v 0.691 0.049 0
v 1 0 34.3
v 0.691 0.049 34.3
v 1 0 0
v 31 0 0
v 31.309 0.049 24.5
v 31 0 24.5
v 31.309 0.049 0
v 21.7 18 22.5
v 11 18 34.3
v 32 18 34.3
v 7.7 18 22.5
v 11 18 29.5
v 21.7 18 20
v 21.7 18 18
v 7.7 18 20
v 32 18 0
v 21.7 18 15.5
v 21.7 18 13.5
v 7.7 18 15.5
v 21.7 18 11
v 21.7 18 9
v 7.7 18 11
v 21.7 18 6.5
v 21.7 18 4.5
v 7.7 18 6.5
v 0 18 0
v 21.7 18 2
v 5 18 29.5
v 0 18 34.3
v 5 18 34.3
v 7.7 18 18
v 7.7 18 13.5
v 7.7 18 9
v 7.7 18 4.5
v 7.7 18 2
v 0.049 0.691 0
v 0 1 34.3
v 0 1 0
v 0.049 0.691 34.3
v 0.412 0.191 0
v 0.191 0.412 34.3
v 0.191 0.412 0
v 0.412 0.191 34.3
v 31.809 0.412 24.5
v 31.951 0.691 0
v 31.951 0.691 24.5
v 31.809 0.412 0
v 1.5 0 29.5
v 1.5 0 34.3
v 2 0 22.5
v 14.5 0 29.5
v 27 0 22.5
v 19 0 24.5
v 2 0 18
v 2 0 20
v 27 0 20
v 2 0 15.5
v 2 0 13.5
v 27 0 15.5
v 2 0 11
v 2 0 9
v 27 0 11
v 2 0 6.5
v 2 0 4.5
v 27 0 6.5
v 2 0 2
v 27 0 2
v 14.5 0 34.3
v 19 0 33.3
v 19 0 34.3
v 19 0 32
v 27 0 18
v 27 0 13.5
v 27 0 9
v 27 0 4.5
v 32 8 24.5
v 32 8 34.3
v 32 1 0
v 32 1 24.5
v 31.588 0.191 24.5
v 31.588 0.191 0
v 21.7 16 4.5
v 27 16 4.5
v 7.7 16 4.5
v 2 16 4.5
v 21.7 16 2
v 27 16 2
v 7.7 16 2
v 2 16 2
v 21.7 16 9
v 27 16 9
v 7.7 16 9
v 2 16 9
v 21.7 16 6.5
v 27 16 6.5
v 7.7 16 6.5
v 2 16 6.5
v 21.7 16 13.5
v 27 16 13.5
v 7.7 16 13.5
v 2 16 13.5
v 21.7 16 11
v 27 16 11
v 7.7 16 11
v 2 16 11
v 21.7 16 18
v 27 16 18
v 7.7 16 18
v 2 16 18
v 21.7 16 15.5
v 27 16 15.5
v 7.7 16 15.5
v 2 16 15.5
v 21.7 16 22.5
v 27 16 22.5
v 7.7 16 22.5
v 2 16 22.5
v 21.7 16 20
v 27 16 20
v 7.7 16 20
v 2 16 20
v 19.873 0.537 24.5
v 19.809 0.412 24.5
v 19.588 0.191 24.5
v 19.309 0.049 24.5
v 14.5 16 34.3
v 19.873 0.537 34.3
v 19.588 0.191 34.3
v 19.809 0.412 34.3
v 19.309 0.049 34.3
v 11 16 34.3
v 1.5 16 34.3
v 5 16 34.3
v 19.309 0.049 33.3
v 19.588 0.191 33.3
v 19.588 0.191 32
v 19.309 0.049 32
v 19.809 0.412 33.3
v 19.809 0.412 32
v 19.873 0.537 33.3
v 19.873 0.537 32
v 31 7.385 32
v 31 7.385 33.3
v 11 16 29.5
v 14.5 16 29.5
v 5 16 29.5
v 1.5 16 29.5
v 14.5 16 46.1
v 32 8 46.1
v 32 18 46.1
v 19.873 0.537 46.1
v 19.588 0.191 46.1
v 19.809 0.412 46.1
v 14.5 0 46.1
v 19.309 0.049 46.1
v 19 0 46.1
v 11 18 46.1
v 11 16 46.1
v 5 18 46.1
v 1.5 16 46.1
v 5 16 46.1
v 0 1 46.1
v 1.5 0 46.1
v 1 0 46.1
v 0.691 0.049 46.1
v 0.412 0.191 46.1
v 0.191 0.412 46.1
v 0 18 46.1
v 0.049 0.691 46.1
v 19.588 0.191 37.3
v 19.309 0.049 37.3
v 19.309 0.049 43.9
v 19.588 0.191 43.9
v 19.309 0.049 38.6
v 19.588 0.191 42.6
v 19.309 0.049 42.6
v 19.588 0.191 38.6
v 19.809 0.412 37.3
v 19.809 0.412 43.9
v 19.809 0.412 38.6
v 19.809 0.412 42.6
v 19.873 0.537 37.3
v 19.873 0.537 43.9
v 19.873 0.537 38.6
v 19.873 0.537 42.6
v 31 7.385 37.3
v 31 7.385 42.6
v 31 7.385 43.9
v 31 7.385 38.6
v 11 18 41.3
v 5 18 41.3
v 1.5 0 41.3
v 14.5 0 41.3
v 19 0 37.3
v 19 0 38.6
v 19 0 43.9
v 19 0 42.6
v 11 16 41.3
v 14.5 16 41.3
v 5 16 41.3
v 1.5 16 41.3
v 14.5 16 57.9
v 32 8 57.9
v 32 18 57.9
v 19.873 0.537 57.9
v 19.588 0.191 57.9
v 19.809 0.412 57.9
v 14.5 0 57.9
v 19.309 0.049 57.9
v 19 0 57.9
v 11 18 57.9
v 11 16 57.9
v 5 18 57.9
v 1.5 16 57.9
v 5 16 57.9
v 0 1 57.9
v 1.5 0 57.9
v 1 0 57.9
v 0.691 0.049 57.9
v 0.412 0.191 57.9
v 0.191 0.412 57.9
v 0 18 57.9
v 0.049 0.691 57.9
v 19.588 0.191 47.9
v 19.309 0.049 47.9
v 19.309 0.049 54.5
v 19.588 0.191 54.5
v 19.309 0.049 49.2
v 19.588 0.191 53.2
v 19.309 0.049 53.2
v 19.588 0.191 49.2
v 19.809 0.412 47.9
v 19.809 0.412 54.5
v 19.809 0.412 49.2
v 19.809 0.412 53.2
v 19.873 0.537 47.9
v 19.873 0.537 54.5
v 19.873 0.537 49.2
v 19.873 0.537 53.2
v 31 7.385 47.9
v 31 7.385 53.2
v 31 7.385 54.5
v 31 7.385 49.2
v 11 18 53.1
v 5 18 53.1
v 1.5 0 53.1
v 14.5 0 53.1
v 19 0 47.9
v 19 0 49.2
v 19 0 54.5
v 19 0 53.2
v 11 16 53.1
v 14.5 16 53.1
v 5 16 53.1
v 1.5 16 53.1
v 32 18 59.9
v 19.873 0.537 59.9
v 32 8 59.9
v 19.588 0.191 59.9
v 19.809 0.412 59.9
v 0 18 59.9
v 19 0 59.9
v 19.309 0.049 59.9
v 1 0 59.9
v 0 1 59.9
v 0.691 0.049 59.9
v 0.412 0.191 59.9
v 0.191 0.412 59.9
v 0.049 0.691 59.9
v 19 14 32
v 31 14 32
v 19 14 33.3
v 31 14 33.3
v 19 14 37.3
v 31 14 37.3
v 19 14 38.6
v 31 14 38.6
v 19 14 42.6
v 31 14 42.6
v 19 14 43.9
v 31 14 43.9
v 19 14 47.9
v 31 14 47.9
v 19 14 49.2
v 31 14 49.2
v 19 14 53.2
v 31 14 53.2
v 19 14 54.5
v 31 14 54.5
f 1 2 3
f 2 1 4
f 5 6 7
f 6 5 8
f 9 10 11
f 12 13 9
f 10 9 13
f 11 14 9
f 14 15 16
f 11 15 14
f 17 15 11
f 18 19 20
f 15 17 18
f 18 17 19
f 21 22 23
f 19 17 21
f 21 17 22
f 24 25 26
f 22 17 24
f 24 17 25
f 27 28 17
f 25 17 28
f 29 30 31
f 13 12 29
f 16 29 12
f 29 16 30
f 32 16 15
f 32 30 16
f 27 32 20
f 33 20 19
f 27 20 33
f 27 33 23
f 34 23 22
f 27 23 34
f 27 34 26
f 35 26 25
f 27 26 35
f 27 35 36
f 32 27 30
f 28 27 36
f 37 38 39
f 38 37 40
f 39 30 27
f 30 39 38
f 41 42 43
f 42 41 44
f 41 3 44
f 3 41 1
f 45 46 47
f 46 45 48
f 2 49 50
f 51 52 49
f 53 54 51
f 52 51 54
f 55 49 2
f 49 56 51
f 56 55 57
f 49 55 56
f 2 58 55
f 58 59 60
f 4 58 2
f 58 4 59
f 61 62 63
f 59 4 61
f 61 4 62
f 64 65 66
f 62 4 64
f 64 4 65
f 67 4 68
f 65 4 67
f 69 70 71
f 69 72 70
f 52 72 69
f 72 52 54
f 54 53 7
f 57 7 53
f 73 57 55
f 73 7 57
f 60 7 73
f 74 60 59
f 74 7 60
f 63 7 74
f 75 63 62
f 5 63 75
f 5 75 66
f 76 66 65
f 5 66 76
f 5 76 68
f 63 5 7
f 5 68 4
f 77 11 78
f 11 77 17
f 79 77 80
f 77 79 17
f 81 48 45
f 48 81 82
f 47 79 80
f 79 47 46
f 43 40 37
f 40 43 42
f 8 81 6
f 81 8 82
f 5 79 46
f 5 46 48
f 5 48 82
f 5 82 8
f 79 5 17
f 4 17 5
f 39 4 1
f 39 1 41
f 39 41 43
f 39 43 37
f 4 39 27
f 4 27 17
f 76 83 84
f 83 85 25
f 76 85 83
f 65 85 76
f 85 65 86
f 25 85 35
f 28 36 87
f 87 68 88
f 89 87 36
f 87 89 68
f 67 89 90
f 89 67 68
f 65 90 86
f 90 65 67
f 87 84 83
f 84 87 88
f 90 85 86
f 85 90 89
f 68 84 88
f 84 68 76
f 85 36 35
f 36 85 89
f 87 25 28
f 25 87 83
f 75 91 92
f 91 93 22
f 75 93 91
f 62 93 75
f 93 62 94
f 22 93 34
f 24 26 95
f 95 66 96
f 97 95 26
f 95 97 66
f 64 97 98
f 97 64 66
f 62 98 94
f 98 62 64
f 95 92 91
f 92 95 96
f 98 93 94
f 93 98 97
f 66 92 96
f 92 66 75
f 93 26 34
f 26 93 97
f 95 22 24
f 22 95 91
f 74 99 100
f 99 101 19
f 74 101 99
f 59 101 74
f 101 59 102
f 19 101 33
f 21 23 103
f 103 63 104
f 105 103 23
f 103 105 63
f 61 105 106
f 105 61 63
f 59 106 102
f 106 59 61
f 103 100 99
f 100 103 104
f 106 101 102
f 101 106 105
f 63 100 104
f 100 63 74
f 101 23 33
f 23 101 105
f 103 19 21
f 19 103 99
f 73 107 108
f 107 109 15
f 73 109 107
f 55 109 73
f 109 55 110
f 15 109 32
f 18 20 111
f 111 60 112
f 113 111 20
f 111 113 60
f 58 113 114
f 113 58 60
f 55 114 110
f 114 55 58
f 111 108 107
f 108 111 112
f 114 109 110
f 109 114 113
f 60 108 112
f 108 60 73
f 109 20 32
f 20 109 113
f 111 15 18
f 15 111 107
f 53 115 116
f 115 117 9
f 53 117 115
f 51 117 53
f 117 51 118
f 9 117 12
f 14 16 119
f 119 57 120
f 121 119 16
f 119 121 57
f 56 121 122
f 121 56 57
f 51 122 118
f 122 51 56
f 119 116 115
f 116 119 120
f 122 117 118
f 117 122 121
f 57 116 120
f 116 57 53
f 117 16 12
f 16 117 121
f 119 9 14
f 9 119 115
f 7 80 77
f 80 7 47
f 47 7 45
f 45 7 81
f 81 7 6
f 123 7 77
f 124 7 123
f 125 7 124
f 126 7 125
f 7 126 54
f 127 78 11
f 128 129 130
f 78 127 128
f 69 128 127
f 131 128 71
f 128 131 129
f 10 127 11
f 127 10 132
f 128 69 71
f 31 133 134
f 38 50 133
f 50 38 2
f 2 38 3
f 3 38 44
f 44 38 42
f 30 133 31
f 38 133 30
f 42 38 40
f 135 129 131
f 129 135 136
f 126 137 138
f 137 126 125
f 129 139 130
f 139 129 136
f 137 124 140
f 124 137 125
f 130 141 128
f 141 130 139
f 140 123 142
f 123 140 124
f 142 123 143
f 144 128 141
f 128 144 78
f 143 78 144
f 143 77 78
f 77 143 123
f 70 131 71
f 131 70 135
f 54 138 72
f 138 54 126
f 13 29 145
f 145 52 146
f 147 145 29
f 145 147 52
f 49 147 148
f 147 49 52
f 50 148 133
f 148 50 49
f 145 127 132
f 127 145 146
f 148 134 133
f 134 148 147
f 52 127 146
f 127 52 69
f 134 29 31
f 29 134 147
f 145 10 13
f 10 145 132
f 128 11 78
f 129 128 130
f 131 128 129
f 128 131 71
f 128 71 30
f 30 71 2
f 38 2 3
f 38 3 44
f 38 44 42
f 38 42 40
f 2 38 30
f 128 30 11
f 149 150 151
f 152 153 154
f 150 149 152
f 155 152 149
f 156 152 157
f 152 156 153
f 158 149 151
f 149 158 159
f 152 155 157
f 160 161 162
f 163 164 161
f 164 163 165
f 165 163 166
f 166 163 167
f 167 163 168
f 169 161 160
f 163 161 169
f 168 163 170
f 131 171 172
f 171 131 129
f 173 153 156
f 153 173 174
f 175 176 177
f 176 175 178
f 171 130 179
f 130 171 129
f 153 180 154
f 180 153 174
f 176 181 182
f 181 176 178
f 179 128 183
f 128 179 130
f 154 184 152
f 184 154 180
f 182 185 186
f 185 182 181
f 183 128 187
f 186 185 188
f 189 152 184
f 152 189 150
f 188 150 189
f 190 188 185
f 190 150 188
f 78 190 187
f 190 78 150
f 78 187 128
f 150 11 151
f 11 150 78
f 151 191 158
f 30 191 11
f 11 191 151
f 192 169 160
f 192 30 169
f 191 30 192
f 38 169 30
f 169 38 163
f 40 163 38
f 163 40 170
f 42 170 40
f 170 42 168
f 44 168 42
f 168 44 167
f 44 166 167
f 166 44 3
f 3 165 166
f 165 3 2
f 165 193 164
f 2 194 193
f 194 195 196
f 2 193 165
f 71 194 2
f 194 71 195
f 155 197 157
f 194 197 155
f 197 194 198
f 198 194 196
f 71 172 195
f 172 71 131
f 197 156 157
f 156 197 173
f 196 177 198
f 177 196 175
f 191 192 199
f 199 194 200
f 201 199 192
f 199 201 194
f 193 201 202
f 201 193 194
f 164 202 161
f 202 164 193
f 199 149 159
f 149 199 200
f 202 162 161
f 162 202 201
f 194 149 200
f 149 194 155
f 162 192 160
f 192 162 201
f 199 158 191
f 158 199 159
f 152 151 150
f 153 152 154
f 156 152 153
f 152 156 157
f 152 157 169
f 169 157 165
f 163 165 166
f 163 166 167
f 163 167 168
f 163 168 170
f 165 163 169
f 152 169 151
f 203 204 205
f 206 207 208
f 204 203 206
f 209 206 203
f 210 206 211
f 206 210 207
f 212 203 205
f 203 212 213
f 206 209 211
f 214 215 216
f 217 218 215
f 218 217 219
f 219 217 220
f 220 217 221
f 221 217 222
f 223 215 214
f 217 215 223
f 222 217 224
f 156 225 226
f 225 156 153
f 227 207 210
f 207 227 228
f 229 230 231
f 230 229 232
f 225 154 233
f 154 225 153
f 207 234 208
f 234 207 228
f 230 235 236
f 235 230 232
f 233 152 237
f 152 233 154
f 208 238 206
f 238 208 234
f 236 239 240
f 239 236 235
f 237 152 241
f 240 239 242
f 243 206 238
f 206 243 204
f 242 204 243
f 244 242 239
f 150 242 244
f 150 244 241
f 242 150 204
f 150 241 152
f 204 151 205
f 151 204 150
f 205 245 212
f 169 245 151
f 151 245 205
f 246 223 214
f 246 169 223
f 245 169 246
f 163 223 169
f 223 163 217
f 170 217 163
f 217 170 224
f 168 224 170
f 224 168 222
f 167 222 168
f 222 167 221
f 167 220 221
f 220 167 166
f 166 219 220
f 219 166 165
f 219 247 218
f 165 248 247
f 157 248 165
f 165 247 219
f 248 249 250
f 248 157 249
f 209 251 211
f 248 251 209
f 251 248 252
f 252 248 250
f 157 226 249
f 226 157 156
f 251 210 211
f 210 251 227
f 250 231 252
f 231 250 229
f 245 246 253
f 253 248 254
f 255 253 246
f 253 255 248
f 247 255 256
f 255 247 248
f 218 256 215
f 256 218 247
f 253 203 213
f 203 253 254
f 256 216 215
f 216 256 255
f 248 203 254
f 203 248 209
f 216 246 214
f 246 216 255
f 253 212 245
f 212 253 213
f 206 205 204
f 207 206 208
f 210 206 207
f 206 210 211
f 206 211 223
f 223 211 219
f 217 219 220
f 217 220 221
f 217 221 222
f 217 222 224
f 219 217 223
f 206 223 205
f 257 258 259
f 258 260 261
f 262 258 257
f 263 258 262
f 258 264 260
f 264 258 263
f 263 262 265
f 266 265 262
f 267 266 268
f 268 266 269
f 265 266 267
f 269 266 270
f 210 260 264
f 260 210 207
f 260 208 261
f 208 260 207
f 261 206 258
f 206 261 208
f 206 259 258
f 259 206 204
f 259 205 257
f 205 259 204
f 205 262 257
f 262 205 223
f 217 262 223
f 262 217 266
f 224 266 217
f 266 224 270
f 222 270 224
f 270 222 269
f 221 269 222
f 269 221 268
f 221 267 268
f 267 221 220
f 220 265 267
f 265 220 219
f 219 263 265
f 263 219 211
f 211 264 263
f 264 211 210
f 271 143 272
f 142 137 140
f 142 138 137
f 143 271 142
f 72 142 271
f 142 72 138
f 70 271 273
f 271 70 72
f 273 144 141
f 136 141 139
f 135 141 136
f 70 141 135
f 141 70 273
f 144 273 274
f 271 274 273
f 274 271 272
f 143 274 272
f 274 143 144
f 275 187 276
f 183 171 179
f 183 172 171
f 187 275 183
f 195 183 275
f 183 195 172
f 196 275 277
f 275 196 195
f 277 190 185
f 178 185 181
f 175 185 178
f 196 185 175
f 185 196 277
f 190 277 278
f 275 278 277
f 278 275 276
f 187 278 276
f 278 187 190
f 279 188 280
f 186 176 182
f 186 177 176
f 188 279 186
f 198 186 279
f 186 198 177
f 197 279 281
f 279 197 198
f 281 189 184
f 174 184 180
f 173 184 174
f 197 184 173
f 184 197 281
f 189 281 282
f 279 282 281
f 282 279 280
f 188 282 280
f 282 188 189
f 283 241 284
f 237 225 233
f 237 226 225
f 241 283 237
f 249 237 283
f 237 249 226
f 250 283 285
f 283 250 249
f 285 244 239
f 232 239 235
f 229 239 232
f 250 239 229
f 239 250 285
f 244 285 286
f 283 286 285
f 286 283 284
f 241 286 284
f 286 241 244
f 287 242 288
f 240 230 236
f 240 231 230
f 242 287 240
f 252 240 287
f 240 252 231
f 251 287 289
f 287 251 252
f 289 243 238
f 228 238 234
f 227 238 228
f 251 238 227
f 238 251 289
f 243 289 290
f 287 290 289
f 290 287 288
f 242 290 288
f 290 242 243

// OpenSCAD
// 
// (c) g3org 

//Count of SD Slots
    count_SD = 5;
//SD Card thickness
    SD_thickness=2.5;

//Count of SD Slots
    count_USB = 3;
//USB Slot thickness
    USB_thickness =4.8;
//Space between USB Slots
    USB_space = 7;

//Count micro SD 
    count_microSD =5;
//micro SD thickness
    microSD_thickness =1.3;


//Full_Render


/* [Hidden] */
$fn=20;

//inputs end

color("LawnGreen"){  
    SD_Card_render();
        difference() {
            USB_Slot();
            microSD();
        }
}



module microSD(){
    
    
     //micro SD_slot
    for (i = [ 0 : count_microSD-1 ] ) {
    
            translate([19,0,((count_SD*(SD_thickness+2.5))+USB_space)+(i*(microSD_thickness+4))]){
                linear_extrude(height = microSD_thickness, center = false, convexity = 10) {
                square([12,14]);
                }
            }
    }
}
module USB_Slot(){
    
  translate([0,0,count_SD*(SD_thickness+2)]){
   for (i = [ 0-1 : count_USB-2 ] ) {    
       
    translate([0,0,i*(USB_space+USB_thickness) ]){
        echo(i,i*(USB_space+USB_thickness));  
        difference() {
            // Block plus Rundung
            linear_extrude(height = USB_thickness+USB_space, center = false, convexity = 10) {
            translate([19,1,0,])  circle(1);
                translate([1,1,0,])  circle(1);
                polygon([[1,0],[19,0],[32,8],[32,18],[0,18],[0,1]],[[0,1,2,3,4,5]]);
           }
 //USB_slot_Schlitz
            translate([1.5,-3,USB_space]){
                linear_extrude(height = USB_thickness, center = false, convexity = 10) {
                square([13,19]);
                }
            }
  //Bodendurchbruch          
             translate([5,1,USB_space,]){
                linear_extrude(height = USB_thickness, center = false, convexity = 10) {
                square([6,19]);
                }
            } 
        } 
    } 
    i = i+1; 
  } 
  
  //Abschlussplatte_USB_Slots
      translate([0,0,count_USB*(USB_thickness+USB_space)]){
          linear_extrude(height = 2, center = false, convexity = 10) {
                translate([19,1,0,])  circle(1);
                translate([1,1,0,])  circle(1);
                polygon([[1,0],[19,0],[32,8],[32,18],[0,18],[0,1]],[[0,1,2,3,4,5]]);
            }
       } 
    }
}


module SD_Card_render(){
    
  for (i = [ 0 : count_SD-1 ] ) {    
    translate([0,0,i*(SD_thickness+2)-(SD_thickness+2)]){
        difference() {
            // Block plus Rundung
            linear_extrude(height = SD_thickness+2, center = false, convexity = 10) {
                translate([1,0,0,])   square([30,17]);
                translate([0,1,0,])  square([32,17]);
                translate([31,1,0,])  circle(1);
                translate([1,1,0,])  circle(1);
            }
  //SD_slot_Schlitz
            translate([2,-3,2,]){
                linear_extrude(height = SD_thickness, center = false, convexity = 10) {
                square([25,19]);
                }
            }
  //Bodendurchbruch          
            translate([7.7,1,2,]){
                linear_extrude(height = SD_thickness, center = false, convexity = 10) {
                square([14,19]);
                }
            }
        }
    }
    i = i+1;
  }
  //Abschlussplatte_SD_Cars Slots
      translate([0,0,count_SD*(SD_thickness+2)]){
          linear_extrude(height = 2, center = false, convexity = 10) {
                translate([1,0,0,])   square([30,17]);
                translate([0,1,0,])  square([32,17]);
                translate([31,1,0,])  circle(1);
                translate([1,1,0,])  circle(1);
            }
        }
}









